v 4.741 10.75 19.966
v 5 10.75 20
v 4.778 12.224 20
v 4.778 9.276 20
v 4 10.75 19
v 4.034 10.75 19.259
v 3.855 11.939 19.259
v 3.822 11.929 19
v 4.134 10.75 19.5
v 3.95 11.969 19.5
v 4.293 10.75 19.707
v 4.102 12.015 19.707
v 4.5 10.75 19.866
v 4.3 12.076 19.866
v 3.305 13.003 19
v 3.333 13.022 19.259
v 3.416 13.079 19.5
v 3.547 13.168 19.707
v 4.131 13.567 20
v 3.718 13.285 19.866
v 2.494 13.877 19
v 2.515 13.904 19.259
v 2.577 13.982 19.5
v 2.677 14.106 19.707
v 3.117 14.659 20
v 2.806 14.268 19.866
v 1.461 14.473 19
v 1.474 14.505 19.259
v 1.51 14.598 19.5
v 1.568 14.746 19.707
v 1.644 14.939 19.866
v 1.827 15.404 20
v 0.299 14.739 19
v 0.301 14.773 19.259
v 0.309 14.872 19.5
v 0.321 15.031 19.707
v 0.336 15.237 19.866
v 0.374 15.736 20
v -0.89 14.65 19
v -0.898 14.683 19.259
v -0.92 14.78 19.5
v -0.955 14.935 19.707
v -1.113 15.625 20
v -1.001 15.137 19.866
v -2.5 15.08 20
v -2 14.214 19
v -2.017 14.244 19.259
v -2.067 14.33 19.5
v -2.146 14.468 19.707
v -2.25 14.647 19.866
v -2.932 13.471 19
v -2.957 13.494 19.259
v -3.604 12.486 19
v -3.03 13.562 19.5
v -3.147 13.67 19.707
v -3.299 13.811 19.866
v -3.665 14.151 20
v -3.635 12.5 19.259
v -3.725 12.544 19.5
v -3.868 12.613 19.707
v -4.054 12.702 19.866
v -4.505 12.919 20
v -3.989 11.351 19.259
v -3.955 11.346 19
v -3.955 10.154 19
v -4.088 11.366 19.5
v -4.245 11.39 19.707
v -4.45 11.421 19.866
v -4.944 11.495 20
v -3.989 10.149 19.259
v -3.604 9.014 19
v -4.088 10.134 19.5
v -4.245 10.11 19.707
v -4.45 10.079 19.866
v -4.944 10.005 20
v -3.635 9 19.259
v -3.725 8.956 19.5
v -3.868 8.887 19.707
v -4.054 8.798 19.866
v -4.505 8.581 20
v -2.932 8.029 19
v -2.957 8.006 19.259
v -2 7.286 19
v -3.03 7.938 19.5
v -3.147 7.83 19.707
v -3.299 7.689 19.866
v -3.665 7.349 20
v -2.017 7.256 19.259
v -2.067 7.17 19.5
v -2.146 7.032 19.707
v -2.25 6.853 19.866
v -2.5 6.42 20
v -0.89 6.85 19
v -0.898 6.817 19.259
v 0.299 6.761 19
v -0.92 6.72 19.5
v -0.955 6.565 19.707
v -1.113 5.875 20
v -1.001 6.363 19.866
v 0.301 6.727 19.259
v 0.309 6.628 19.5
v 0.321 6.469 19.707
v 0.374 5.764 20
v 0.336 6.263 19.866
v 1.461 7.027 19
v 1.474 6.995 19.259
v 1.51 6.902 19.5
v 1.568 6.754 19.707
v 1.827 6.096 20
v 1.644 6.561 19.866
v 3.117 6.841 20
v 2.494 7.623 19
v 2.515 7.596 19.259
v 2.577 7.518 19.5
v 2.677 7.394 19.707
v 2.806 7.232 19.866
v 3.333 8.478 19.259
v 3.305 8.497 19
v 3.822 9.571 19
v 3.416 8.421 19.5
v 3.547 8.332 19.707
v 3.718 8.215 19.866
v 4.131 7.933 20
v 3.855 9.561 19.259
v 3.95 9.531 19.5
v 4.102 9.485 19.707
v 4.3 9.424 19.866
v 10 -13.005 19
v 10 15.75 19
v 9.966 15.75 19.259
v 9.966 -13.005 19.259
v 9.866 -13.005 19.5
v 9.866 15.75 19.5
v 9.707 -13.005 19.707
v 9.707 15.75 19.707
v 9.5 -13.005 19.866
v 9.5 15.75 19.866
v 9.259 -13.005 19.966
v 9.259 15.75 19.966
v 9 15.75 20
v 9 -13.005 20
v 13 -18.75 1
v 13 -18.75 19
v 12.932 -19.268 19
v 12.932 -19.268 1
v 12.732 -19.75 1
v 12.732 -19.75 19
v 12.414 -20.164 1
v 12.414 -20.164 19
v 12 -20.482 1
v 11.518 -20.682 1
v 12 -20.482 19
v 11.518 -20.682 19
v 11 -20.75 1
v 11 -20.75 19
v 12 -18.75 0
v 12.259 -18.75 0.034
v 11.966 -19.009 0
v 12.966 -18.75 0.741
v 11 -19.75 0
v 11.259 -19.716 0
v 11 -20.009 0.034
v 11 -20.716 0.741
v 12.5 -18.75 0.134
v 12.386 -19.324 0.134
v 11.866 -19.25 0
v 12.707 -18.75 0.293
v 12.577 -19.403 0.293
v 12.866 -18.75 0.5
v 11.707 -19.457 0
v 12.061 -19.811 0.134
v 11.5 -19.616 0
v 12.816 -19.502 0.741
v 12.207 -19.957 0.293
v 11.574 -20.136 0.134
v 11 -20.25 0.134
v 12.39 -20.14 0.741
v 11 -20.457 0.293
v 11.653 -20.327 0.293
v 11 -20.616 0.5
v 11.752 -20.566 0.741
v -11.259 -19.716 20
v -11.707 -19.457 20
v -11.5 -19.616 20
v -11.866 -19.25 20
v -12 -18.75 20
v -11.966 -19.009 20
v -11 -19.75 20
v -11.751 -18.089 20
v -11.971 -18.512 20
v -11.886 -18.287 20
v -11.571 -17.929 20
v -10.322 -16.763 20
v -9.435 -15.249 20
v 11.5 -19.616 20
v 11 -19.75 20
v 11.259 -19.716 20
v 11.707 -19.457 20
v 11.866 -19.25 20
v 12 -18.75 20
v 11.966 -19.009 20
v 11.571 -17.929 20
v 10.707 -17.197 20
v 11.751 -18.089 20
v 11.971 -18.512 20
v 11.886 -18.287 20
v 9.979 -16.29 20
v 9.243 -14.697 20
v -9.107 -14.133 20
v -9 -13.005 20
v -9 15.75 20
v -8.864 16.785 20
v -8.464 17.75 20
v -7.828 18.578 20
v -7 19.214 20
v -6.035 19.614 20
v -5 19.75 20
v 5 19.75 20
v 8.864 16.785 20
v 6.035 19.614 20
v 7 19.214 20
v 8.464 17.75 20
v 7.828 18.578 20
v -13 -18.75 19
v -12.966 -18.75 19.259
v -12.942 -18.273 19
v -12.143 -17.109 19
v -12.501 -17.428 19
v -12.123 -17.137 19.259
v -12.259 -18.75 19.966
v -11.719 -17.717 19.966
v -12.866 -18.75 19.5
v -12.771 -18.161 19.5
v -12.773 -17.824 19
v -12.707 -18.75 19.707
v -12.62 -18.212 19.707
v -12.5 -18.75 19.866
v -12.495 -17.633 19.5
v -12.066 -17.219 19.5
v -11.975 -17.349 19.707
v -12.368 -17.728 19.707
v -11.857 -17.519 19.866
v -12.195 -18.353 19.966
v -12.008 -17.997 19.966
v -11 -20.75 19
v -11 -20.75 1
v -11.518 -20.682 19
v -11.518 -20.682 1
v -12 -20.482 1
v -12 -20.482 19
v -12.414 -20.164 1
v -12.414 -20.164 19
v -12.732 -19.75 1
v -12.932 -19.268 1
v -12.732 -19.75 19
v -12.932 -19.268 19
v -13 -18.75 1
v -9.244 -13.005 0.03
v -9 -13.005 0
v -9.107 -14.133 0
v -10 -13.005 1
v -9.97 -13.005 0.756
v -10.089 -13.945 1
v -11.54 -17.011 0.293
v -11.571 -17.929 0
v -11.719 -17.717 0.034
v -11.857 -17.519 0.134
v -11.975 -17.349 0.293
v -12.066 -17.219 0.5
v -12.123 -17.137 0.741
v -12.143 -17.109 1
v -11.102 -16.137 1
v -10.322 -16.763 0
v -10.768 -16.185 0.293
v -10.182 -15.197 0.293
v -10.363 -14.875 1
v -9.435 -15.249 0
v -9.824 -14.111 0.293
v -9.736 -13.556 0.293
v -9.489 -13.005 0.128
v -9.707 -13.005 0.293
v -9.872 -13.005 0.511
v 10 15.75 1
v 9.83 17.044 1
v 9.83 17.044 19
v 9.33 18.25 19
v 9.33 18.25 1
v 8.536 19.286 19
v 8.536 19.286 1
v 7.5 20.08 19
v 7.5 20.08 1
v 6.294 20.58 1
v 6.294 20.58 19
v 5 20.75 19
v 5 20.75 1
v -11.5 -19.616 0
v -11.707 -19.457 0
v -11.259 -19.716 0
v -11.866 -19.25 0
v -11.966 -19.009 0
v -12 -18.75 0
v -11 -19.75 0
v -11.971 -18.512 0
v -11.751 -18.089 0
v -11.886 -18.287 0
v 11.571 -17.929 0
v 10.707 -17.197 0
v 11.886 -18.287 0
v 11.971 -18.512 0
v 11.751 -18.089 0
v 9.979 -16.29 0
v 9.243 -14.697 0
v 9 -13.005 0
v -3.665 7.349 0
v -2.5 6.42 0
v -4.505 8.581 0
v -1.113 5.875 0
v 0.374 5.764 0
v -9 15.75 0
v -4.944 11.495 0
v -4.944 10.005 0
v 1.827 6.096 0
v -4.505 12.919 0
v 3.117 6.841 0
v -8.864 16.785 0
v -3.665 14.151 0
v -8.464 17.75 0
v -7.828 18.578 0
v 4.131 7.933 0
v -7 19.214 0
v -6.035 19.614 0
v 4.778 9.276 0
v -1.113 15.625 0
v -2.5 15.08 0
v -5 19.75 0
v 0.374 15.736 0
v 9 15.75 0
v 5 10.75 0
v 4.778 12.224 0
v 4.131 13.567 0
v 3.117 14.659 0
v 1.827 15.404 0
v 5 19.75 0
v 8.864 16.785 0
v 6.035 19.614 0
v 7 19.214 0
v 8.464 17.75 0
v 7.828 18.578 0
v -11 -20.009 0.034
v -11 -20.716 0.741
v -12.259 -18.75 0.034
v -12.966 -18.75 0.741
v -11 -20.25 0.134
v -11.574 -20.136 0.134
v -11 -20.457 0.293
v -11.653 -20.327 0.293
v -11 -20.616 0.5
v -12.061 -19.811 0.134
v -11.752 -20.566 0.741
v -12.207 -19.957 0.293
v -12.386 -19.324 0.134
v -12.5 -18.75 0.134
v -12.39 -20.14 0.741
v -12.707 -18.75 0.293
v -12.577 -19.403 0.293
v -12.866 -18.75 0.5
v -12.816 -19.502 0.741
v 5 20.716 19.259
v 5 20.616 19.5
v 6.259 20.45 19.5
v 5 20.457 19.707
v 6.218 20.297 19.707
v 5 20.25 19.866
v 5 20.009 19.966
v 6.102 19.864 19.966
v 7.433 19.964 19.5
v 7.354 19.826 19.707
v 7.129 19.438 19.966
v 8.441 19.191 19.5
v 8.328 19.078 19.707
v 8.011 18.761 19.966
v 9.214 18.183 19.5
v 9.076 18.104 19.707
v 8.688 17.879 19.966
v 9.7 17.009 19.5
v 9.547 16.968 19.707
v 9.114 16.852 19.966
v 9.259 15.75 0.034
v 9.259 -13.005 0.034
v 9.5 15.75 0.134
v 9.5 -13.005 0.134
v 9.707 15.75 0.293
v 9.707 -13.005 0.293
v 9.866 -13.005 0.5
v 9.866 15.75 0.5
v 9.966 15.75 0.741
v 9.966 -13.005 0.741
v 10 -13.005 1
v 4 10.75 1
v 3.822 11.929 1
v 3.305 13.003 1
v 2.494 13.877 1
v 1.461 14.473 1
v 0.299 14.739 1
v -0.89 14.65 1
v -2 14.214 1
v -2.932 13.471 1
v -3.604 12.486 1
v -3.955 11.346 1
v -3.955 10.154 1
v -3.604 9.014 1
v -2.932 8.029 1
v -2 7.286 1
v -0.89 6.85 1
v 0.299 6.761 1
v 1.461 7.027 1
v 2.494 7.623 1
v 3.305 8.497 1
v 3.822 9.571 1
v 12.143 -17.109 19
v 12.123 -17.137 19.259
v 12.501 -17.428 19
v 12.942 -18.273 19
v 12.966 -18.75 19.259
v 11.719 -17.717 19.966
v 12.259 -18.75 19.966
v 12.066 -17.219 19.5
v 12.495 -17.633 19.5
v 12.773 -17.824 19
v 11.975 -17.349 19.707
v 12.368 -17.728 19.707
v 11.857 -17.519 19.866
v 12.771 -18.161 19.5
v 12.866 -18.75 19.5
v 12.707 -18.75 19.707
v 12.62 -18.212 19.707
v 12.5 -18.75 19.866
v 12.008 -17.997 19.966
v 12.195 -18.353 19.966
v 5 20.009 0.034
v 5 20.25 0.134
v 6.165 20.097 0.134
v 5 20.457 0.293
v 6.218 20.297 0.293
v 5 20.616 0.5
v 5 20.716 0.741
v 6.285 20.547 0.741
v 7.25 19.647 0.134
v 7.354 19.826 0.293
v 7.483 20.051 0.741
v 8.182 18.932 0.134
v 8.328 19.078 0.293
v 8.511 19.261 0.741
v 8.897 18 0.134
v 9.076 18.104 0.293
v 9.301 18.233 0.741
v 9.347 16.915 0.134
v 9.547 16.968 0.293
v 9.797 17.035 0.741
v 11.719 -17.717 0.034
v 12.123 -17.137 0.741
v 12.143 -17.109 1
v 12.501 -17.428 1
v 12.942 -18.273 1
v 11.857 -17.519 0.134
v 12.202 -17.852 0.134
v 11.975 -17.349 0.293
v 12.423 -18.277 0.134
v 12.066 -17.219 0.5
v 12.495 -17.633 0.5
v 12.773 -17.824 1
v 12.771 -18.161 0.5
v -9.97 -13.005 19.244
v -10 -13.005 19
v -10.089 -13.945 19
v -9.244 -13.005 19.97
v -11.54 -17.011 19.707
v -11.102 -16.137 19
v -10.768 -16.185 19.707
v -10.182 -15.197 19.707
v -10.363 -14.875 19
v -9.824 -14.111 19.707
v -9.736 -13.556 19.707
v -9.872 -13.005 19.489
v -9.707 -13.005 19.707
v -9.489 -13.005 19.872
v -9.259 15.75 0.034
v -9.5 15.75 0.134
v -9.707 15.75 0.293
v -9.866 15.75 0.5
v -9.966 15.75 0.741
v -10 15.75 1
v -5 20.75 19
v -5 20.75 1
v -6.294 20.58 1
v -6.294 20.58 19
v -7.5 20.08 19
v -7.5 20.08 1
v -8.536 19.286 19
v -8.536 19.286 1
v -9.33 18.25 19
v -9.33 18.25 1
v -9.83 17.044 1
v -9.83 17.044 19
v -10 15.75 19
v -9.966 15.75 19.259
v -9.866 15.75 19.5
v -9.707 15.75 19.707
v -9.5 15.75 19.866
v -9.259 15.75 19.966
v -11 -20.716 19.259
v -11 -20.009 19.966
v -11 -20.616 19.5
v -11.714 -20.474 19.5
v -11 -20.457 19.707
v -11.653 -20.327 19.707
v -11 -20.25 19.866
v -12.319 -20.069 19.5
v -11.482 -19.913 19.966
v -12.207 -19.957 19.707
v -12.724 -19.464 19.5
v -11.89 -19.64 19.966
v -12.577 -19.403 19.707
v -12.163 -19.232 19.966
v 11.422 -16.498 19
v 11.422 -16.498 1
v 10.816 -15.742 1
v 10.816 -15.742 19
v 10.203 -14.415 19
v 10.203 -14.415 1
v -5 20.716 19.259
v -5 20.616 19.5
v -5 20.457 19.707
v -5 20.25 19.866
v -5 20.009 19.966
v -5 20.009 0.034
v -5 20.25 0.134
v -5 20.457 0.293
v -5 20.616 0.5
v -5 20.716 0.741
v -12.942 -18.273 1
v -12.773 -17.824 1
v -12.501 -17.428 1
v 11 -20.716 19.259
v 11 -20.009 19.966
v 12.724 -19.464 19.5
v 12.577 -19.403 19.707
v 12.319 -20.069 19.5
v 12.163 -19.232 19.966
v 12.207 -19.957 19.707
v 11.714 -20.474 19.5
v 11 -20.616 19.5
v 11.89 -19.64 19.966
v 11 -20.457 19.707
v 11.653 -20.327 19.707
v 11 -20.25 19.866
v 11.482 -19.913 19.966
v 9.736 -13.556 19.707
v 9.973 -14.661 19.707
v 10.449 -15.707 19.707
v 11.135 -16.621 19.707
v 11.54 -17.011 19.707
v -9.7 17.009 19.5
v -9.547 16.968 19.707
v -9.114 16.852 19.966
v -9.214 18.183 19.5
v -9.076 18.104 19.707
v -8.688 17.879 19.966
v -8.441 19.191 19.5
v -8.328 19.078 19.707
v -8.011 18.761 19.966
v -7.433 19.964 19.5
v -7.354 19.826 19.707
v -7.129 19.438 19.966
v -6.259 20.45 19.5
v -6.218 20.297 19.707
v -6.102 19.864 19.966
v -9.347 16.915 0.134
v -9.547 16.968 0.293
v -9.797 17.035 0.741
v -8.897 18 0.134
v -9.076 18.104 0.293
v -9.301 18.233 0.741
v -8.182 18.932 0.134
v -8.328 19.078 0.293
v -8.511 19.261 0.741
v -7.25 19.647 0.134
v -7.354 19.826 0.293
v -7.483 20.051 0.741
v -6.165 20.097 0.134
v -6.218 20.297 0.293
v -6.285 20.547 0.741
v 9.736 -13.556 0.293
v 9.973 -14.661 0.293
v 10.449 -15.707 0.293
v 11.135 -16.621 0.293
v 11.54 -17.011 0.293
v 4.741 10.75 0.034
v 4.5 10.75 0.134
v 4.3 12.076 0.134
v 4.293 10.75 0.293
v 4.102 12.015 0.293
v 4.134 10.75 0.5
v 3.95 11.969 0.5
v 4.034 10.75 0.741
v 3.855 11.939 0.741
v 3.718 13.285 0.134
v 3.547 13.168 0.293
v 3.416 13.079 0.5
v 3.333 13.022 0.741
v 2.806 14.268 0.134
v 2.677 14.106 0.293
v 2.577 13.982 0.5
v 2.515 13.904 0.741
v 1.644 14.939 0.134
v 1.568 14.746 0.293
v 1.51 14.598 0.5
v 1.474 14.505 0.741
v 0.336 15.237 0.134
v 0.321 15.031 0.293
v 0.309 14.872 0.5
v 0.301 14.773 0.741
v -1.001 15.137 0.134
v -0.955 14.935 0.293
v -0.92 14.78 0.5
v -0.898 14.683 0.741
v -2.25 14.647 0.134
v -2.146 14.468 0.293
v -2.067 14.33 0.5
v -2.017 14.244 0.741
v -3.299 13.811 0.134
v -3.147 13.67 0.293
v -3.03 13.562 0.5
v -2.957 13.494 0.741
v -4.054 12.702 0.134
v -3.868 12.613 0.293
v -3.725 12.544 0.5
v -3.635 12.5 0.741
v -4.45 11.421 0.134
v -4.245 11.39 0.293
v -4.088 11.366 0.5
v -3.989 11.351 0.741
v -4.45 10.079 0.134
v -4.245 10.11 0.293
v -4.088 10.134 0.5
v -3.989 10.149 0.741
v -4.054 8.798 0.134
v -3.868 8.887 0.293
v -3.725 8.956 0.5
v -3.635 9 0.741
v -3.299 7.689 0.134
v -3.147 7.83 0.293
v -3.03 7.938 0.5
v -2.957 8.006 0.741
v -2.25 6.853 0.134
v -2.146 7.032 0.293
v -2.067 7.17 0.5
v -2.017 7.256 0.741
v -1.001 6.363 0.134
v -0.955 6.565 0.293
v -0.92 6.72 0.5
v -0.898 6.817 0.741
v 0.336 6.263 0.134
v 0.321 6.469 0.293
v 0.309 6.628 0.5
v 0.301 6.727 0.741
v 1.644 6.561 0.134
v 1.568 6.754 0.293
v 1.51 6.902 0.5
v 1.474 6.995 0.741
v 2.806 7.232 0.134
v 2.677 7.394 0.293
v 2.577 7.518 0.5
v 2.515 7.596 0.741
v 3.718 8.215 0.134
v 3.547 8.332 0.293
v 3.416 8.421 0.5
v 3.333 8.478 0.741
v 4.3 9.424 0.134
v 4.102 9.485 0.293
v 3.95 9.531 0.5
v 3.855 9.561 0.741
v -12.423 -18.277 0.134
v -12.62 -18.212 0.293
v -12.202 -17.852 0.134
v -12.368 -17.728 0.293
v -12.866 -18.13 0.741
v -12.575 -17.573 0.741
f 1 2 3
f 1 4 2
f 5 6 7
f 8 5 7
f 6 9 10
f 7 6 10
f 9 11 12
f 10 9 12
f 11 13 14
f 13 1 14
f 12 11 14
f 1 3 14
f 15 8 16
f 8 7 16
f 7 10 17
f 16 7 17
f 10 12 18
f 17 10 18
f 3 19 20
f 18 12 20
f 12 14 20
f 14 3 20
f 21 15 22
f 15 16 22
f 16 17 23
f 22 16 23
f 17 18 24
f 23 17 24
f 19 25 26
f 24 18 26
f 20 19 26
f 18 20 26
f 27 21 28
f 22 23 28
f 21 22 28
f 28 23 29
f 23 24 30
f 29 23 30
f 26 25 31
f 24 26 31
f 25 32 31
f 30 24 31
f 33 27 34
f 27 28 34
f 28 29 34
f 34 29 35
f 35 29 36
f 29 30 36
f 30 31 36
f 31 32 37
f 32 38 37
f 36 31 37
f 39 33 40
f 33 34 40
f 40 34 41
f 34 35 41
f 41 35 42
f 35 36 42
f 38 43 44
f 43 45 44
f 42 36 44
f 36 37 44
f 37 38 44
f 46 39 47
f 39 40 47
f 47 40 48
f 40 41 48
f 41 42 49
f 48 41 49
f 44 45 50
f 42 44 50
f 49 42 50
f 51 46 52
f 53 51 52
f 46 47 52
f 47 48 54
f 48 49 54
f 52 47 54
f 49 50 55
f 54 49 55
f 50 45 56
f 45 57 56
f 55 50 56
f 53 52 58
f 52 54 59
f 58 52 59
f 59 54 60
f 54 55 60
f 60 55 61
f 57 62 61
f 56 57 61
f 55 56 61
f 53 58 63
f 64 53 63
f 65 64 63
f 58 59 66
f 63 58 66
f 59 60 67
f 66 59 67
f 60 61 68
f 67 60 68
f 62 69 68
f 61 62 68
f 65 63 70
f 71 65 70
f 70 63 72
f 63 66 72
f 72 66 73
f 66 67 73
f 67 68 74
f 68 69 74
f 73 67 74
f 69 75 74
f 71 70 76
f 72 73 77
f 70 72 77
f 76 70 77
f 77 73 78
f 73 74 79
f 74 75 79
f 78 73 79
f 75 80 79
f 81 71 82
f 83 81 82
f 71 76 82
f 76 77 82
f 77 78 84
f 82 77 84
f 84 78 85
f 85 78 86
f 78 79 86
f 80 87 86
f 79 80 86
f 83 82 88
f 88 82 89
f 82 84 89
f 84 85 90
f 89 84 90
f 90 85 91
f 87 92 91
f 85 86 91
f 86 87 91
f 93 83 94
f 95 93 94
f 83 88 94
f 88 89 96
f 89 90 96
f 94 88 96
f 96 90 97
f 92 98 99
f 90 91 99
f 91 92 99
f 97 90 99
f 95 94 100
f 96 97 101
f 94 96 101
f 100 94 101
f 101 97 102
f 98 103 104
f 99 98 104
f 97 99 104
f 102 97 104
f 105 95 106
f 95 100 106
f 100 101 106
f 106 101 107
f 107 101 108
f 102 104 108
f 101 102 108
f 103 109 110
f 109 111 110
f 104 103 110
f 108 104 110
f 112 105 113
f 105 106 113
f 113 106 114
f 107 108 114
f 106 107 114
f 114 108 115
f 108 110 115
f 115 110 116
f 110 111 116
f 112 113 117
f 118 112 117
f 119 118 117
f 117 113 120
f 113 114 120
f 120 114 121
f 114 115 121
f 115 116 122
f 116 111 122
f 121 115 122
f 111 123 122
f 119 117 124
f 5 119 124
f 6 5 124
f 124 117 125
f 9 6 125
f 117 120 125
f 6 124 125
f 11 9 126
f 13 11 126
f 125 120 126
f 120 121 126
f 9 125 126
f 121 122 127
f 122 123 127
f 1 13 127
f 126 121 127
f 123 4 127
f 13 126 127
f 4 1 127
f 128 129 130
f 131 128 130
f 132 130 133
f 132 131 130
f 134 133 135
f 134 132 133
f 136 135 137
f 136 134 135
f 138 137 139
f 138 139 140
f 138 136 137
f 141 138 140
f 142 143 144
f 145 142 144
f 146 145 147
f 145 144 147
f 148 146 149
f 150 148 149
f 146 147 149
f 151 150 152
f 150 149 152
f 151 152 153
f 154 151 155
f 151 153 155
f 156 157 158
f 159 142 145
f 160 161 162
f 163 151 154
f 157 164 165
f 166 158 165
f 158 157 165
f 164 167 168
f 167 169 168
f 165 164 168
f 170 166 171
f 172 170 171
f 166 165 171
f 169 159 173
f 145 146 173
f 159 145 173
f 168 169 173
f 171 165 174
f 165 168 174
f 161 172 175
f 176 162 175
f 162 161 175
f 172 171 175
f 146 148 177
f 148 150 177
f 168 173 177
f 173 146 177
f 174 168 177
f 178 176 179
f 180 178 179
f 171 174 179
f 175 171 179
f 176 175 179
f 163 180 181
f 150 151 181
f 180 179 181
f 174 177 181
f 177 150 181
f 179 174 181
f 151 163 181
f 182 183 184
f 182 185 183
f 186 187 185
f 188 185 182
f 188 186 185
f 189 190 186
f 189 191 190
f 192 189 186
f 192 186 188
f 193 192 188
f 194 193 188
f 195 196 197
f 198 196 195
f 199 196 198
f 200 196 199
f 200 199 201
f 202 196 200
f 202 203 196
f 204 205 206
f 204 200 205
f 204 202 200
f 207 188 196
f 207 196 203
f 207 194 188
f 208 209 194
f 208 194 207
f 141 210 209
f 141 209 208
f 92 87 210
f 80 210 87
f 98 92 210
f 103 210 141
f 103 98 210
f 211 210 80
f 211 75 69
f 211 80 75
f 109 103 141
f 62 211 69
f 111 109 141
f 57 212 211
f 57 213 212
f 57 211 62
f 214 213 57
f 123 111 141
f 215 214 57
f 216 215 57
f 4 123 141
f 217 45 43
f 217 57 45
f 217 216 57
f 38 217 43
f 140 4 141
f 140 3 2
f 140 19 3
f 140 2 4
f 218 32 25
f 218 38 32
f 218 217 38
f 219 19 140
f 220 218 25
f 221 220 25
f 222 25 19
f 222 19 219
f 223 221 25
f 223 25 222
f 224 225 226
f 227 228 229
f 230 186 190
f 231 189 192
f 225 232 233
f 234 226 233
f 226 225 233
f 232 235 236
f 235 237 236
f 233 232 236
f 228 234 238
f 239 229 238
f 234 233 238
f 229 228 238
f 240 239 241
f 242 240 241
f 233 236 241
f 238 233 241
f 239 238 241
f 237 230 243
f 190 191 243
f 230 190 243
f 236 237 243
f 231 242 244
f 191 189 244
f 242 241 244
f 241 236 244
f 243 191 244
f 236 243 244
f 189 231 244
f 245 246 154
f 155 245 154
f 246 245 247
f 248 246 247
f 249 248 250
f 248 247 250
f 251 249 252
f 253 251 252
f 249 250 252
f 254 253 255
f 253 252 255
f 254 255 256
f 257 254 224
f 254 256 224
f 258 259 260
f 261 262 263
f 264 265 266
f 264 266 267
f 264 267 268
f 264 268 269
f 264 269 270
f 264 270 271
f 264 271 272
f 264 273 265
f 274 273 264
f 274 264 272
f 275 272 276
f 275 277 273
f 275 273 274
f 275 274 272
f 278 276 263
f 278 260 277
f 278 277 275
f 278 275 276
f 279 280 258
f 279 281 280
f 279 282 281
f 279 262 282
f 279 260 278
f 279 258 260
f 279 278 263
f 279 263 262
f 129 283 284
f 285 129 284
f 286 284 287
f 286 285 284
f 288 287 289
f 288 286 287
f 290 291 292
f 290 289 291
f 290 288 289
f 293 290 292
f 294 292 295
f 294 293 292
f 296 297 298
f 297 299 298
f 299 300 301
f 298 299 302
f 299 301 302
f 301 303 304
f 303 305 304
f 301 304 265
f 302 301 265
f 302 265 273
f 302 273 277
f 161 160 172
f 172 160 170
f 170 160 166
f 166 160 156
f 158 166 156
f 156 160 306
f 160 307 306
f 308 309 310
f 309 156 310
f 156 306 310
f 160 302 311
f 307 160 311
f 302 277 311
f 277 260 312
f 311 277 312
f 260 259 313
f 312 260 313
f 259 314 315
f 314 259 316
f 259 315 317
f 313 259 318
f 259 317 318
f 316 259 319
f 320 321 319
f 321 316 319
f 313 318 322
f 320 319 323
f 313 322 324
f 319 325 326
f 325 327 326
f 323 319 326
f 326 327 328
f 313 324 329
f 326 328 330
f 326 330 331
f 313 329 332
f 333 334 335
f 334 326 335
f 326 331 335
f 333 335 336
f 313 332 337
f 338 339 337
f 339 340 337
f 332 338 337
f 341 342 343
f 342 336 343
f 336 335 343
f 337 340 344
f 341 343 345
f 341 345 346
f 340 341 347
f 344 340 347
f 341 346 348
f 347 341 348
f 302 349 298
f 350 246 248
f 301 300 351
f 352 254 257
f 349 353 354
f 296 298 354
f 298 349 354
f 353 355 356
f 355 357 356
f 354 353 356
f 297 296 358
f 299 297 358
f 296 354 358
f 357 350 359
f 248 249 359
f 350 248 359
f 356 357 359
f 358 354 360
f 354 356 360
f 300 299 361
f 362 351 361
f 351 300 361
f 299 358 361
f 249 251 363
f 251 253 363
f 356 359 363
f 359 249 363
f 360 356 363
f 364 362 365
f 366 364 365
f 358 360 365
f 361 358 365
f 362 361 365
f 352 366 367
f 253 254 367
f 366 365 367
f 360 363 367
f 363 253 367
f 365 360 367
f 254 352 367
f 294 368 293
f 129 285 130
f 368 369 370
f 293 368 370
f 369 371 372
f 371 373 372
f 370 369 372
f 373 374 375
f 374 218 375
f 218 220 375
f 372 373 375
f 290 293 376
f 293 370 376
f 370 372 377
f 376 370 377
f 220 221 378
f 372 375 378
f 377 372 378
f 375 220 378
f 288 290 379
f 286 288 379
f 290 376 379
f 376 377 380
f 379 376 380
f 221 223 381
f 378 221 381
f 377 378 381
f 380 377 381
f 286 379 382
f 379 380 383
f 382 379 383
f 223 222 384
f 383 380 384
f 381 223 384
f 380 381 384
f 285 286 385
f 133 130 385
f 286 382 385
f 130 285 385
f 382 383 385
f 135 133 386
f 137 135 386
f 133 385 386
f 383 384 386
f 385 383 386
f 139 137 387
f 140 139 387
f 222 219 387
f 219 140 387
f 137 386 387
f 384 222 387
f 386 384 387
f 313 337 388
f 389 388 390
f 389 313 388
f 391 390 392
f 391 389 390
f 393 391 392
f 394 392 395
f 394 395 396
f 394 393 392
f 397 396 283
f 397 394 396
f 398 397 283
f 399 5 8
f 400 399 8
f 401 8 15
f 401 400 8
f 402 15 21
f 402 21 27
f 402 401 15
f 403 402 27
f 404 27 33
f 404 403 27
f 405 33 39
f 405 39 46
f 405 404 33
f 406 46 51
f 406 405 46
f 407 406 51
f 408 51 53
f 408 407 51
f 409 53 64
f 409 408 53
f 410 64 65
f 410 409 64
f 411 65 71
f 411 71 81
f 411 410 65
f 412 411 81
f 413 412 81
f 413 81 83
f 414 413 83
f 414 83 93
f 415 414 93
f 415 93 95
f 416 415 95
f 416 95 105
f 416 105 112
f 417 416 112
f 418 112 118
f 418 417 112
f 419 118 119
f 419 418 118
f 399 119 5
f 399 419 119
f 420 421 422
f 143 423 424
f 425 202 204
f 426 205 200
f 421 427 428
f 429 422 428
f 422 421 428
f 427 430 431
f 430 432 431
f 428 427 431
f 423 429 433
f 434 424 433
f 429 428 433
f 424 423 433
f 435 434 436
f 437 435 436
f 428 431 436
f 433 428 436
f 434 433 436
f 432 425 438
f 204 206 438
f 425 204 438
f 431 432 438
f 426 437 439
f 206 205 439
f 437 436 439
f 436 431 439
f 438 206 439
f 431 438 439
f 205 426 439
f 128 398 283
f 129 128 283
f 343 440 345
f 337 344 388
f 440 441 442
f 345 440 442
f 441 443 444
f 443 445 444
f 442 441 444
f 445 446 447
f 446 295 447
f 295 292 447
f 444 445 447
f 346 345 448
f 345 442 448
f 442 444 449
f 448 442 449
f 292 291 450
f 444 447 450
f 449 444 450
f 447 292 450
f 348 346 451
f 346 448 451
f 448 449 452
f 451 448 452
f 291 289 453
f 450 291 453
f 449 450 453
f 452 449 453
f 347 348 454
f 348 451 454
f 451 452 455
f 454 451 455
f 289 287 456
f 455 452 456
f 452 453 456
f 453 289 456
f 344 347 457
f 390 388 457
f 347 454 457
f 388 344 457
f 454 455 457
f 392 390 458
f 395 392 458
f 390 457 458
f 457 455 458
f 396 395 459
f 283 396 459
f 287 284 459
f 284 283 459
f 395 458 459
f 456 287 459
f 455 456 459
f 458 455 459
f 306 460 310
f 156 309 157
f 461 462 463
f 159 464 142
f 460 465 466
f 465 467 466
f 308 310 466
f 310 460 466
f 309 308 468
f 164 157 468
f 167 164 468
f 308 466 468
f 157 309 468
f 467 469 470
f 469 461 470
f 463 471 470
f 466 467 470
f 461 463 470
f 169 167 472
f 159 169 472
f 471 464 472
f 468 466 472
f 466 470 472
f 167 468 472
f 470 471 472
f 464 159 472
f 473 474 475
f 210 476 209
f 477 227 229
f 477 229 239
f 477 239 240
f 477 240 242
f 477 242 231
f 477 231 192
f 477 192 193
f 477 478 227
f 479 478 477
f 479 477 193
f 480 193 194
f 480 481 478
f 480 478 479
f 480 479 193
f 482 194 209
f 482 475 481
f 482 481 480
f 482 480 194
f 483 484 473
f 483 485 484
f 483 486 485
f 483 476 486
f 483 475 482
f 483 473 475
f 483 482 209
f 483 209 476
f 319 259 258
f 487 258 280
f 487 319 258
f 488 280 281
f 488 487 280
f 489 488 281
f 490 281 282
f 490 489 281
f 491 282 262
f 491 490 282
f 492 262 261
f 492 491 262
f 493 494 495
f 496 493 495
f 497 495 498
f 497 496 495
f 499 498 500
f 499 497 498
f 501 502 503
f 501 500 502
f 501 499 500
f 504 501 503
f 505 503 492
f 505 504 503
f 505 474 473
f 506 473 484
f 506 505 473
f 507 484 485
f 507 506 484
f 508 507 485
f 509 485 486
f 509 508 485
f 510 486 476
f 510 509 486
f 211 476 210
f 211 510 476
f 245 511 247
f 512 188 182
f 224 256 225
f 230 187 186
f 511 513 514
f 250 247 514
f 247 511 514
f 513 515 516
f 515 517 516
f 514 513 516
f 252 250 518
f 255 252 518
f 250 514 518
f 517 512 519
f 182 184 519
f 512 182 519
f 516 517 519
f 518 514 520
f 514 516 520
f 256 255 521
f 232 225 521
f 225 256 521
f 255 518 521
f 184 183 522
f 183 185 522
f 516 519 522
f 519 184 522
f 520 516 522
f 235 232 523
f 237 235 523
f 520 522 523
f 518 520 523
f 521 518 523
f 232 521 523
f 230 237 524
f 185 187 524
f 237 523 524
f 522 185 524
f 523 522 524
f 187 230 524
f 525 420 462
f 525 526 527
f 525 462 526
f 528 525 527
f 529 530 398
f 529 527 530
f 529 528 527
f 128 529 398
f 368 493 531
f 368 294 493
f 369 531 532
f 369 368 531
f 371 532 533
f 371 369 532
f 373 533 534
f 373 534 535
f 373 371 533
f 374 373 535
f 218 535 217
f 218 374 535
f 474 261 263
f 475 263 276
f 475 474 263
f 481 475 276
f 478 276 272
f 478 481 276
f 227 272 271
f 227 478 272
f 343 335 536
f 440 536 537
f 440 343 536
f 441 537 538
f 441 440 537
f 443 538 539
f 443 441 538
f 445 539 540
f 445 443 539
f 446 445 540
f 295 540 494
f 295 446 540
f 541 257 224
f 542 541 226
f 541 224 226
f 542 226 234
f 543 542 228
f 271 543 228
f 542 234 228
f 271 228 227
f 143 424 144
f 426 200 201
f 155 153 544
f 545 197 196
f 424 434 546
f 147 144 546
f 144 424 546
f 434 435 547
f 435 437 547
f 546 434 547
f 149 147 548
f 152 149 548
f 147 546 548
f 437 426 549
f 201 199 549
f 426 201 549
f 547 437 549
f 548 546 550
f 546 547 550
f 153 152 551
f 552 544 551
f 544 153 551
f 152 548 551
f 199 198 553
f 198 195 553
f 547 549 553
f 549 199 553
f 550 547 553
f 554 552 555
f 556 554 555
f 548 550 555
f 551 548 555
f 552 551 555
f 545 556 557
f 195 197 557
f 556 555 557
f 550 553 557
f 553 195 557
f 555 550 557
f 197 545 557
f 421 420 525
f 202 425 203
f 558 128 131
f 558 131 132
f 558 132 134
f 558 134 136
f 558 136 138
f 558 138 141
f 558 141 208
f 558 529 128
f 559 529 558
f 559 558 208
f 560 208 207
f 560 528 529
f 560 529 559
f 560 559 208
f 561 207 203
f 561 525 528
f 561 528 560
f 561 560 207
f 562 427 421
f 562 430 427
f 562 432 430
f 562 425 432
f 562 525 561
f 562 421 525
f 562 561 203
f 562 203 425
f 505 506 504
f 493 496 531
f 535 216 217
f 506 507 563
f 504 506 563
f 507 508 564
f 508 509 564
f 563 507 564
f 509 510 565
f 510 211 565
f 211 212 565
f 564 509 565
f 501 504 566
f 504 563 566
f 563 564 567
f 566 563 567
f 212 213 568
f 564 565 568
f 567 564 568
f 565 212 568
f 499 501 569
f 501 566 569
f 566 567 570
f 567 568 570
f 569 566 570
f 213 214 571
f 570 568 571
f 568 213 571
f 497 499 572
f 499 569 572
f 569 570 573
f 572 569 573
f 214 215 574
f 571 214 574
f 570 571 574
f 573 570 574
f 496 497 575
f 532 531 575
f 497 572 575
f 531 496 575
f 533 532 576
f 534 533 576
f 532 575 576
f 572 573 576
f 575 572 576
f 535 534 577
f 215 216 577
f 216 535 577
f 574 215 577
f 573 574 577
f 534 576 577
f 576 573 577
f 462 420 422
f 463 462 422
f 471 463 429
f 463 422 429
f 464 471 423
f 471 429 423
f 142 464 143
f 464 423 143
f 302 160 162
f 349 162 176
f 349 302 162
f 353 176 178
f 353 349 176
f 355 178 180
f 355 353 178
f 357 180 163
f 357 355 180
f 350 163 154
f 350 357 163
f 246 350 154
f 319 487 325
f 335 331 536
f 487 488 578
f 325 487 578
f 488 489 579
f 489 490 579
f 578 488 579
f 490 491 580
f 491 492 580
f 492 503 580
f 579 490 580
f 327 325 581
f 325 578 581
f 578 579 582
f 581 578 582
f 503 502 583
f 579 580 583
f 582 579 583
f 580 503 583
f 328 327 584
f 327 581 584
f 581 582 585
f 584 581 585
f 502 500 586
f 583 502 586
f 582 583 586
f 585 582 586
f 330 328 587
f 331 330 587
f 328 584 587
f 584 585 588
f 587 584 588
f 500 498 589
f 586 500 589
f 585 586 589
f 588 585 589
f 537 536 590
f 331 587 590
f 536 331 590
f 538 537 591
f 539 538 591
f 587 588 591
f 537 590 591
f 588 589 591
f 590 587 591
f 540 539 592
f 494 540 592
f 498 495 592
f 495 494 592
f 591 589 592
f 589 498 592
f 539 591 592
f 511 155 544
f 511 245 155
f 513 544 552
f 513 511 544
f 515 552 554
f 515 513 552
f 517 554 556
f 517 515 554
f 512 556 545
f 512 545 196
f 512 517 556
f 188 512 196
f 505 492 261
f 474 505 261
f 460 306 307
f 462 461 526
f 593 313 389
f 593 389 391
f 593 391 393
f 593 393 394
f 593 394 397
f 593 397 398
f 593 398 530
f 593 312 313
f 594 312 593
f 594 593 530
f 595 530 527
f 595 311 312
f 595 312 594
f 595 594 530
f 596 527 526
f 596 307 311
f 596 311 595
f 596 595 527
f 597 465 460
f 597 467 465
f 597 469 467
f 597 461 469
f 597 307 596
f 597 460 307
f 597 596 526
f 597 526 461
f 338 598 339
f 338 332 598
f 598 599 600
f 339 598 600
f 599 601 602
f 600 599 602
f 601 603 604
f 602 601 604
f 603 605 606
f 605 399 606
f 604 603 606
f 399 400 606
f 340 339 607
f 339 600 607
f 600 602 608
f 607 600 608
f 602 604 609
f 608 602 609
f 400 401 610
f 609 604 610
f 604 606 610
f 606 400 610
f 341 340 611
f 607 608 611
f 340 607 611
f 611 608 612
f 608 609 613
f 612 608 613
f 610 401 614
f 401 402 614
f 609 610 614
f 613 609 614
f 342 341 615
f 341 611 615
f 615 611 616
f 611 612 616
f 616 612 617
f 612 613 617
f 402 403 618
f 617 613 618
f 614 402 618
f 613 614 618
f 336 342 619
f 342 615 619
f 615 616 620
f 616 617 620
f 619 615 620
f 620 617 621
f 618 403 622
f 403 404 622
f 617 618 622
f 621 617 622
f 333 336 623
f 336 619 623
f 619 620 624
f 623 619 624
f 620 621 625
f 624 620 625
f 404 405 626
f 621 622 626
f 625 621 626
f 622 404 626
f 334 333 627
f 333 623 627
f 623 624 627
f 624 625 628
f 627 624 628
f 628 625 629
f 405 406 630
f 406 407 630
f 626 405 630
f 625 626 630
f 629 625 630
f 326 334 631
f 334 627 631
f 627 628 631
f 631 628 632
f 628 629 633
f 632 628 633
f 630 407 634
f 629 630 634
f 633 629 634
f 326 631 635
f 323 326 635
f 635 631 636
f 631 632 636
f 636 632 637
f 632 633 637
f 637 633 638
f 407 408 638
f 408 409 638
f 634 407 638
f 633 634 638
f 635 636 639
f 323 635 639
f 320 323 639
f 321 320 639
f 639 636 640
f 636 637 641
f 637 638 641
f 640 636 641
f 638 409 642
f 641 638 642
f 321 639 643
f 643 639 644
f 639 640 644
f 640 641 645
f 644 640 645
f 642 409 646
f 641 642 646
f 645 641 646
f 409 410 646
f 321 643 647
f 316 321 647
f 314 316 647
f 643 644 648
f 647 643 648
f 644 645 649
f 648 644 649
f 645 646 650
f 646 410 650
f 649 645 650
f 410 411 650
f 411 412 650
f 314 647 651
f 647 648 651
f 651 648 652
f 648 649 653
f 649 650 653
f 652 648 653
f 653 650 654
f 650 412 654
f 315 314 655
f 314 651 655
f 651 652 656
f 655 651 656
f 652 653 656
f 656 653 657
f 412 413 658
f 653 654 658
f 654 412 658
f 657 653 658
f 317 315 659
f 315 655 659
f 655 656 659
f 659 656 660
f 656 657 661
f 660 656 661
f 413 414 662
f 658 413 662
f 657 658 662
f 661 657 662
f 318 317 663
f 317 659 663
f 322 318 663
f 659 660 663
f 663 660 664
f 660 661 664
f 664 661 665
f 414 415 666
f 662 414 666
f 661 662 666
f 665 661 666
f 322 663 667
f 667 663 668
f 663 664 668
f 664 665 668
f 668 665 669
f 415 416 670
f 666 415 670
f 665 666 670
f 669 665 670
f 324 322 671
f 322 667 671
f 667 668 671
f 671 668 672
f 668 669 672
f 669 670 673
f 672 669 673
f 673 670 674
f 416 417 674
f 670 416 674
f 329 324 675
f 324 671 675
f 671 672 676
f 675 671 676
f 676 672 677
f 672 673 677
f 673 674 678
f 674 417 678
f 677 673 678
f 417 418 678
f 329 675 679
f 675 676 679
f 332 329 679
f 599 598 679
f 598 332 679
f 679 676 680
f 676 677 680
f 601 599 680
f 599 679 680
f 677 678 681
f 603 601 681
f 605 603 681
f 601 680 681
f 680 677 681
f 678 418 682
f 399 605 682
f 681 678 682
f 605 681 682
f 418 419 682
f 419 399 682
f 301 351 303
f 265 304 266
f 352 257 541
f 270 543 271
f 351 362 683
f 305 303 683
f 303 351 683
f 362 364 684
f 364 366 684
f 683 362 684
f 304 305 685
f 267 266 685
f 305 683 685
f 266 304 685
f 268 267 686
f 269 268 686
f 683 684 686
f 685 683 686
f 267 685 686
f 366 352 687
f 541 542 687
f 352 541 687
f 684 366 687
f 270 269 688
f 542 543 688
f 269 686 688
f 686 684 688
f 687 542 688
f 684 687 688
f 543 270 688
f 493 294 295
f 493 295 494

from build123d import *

# Parameters (mm, degrees)
F0_R     = 4
F1_DEPTH = 20
F2_R     = 5
F3_R     = 1.99999
F4_R     = 5
F5_R     = 1


# Not quite as in the source:
# - a fillet or chamfer is up to 0.001 mm smaller than in the source, because OpenCascade refuses the exact size


with BuildPart() as f1:
    # F0 (on Top) → F1 (new body)
    with BuildSketch(Plane.XY):
        Polygon((-10, -20.75), (10, -20.75), (13, -20.75), (13, -16.75), (10, -16.75), (10, 20.75), (-10, 20.75), (-10, -16.75), (-13, -16.75), (-13, -20.75), align=None)
        with Locations((0, 10.75)):
            Circle(F0_R, mode=Mode.SUBTRACT)
    extrude(amount=F1_DEPTH)

    # F2
    f2_edges = [f1.edges().sort_by_distance(p)[0] for p in [
        (-10, 20.75, 10),
        (10, 20.75, 10),
    ]]
    fillet(f2_edges, radius=F2_R)

    # F3 (radius 2 in the source; OpenCascade refuses exactly that, so slightly less here)
    f3_edges = [f1.edges().sort_by_distance(p)[0] for p in [
        (-13, -16.75, 10),
        (-13, -20.75, 10),
        (13, -16.75, 10),
        (13, -20.75, 10),
    ]]
    fillet(f3_edges, radius=F3_R)

    # F4
    f4_edges = [f1.edges().sort_by_distance(p)[0] for p in [
        (-10, -16.75, 10),
        (10, -16.75, 10),
    ]]
    fillet(f4_edges, radius=F4_R)

    # F5
    f5_edges = [f1.edges().sort_by_distance(p)[0] for p in [
        (12.772811, -17.824174, 20),
        (10.567975, -15.319984, 20),
        (13, -18.75, 20),
        (10, 1.372284, 20),
        (12.414216, -20.164216, 20),
        (8.535534, 19.285534, 20),
        (0, -20.75, 20),
        (0, 20.75, 20),
        (-12.414216, -20.164216, 20),
        (-8.535534, 19.285534, 20),
        (-13, -18.75, 20),
        (-10, 1.372284, 20),
        (-12.772811, -17.824174, 20),
        (-10.567975, -15.319984, 20),
        (-4, 10.75, 20),
        (12.772811, -17.824174, 0),
        (10.567975, -15.319984, 0),
        (13, -18.75, 0),
        (10, 1.372284, 0),
        (12.414216, -20.164216, 0),
        (8.535534, 19.285534, 0),
        (0, -20.75, 0),
        (0, 20.75, 0),
        (-12.414216, -20.164216, 0),
        (-8.535534, 19.285534, 0),
        (-13, -18.75, 0),
        (-10, 1.372284, 0),
        (-12.772811, -17.824174, 0),
        (-10.567975, -15.319984, 0),
        (-4, 10.75, 0),
    ]]
    fillet(f5_edges, radius=F5_R)


solid = f1.part
